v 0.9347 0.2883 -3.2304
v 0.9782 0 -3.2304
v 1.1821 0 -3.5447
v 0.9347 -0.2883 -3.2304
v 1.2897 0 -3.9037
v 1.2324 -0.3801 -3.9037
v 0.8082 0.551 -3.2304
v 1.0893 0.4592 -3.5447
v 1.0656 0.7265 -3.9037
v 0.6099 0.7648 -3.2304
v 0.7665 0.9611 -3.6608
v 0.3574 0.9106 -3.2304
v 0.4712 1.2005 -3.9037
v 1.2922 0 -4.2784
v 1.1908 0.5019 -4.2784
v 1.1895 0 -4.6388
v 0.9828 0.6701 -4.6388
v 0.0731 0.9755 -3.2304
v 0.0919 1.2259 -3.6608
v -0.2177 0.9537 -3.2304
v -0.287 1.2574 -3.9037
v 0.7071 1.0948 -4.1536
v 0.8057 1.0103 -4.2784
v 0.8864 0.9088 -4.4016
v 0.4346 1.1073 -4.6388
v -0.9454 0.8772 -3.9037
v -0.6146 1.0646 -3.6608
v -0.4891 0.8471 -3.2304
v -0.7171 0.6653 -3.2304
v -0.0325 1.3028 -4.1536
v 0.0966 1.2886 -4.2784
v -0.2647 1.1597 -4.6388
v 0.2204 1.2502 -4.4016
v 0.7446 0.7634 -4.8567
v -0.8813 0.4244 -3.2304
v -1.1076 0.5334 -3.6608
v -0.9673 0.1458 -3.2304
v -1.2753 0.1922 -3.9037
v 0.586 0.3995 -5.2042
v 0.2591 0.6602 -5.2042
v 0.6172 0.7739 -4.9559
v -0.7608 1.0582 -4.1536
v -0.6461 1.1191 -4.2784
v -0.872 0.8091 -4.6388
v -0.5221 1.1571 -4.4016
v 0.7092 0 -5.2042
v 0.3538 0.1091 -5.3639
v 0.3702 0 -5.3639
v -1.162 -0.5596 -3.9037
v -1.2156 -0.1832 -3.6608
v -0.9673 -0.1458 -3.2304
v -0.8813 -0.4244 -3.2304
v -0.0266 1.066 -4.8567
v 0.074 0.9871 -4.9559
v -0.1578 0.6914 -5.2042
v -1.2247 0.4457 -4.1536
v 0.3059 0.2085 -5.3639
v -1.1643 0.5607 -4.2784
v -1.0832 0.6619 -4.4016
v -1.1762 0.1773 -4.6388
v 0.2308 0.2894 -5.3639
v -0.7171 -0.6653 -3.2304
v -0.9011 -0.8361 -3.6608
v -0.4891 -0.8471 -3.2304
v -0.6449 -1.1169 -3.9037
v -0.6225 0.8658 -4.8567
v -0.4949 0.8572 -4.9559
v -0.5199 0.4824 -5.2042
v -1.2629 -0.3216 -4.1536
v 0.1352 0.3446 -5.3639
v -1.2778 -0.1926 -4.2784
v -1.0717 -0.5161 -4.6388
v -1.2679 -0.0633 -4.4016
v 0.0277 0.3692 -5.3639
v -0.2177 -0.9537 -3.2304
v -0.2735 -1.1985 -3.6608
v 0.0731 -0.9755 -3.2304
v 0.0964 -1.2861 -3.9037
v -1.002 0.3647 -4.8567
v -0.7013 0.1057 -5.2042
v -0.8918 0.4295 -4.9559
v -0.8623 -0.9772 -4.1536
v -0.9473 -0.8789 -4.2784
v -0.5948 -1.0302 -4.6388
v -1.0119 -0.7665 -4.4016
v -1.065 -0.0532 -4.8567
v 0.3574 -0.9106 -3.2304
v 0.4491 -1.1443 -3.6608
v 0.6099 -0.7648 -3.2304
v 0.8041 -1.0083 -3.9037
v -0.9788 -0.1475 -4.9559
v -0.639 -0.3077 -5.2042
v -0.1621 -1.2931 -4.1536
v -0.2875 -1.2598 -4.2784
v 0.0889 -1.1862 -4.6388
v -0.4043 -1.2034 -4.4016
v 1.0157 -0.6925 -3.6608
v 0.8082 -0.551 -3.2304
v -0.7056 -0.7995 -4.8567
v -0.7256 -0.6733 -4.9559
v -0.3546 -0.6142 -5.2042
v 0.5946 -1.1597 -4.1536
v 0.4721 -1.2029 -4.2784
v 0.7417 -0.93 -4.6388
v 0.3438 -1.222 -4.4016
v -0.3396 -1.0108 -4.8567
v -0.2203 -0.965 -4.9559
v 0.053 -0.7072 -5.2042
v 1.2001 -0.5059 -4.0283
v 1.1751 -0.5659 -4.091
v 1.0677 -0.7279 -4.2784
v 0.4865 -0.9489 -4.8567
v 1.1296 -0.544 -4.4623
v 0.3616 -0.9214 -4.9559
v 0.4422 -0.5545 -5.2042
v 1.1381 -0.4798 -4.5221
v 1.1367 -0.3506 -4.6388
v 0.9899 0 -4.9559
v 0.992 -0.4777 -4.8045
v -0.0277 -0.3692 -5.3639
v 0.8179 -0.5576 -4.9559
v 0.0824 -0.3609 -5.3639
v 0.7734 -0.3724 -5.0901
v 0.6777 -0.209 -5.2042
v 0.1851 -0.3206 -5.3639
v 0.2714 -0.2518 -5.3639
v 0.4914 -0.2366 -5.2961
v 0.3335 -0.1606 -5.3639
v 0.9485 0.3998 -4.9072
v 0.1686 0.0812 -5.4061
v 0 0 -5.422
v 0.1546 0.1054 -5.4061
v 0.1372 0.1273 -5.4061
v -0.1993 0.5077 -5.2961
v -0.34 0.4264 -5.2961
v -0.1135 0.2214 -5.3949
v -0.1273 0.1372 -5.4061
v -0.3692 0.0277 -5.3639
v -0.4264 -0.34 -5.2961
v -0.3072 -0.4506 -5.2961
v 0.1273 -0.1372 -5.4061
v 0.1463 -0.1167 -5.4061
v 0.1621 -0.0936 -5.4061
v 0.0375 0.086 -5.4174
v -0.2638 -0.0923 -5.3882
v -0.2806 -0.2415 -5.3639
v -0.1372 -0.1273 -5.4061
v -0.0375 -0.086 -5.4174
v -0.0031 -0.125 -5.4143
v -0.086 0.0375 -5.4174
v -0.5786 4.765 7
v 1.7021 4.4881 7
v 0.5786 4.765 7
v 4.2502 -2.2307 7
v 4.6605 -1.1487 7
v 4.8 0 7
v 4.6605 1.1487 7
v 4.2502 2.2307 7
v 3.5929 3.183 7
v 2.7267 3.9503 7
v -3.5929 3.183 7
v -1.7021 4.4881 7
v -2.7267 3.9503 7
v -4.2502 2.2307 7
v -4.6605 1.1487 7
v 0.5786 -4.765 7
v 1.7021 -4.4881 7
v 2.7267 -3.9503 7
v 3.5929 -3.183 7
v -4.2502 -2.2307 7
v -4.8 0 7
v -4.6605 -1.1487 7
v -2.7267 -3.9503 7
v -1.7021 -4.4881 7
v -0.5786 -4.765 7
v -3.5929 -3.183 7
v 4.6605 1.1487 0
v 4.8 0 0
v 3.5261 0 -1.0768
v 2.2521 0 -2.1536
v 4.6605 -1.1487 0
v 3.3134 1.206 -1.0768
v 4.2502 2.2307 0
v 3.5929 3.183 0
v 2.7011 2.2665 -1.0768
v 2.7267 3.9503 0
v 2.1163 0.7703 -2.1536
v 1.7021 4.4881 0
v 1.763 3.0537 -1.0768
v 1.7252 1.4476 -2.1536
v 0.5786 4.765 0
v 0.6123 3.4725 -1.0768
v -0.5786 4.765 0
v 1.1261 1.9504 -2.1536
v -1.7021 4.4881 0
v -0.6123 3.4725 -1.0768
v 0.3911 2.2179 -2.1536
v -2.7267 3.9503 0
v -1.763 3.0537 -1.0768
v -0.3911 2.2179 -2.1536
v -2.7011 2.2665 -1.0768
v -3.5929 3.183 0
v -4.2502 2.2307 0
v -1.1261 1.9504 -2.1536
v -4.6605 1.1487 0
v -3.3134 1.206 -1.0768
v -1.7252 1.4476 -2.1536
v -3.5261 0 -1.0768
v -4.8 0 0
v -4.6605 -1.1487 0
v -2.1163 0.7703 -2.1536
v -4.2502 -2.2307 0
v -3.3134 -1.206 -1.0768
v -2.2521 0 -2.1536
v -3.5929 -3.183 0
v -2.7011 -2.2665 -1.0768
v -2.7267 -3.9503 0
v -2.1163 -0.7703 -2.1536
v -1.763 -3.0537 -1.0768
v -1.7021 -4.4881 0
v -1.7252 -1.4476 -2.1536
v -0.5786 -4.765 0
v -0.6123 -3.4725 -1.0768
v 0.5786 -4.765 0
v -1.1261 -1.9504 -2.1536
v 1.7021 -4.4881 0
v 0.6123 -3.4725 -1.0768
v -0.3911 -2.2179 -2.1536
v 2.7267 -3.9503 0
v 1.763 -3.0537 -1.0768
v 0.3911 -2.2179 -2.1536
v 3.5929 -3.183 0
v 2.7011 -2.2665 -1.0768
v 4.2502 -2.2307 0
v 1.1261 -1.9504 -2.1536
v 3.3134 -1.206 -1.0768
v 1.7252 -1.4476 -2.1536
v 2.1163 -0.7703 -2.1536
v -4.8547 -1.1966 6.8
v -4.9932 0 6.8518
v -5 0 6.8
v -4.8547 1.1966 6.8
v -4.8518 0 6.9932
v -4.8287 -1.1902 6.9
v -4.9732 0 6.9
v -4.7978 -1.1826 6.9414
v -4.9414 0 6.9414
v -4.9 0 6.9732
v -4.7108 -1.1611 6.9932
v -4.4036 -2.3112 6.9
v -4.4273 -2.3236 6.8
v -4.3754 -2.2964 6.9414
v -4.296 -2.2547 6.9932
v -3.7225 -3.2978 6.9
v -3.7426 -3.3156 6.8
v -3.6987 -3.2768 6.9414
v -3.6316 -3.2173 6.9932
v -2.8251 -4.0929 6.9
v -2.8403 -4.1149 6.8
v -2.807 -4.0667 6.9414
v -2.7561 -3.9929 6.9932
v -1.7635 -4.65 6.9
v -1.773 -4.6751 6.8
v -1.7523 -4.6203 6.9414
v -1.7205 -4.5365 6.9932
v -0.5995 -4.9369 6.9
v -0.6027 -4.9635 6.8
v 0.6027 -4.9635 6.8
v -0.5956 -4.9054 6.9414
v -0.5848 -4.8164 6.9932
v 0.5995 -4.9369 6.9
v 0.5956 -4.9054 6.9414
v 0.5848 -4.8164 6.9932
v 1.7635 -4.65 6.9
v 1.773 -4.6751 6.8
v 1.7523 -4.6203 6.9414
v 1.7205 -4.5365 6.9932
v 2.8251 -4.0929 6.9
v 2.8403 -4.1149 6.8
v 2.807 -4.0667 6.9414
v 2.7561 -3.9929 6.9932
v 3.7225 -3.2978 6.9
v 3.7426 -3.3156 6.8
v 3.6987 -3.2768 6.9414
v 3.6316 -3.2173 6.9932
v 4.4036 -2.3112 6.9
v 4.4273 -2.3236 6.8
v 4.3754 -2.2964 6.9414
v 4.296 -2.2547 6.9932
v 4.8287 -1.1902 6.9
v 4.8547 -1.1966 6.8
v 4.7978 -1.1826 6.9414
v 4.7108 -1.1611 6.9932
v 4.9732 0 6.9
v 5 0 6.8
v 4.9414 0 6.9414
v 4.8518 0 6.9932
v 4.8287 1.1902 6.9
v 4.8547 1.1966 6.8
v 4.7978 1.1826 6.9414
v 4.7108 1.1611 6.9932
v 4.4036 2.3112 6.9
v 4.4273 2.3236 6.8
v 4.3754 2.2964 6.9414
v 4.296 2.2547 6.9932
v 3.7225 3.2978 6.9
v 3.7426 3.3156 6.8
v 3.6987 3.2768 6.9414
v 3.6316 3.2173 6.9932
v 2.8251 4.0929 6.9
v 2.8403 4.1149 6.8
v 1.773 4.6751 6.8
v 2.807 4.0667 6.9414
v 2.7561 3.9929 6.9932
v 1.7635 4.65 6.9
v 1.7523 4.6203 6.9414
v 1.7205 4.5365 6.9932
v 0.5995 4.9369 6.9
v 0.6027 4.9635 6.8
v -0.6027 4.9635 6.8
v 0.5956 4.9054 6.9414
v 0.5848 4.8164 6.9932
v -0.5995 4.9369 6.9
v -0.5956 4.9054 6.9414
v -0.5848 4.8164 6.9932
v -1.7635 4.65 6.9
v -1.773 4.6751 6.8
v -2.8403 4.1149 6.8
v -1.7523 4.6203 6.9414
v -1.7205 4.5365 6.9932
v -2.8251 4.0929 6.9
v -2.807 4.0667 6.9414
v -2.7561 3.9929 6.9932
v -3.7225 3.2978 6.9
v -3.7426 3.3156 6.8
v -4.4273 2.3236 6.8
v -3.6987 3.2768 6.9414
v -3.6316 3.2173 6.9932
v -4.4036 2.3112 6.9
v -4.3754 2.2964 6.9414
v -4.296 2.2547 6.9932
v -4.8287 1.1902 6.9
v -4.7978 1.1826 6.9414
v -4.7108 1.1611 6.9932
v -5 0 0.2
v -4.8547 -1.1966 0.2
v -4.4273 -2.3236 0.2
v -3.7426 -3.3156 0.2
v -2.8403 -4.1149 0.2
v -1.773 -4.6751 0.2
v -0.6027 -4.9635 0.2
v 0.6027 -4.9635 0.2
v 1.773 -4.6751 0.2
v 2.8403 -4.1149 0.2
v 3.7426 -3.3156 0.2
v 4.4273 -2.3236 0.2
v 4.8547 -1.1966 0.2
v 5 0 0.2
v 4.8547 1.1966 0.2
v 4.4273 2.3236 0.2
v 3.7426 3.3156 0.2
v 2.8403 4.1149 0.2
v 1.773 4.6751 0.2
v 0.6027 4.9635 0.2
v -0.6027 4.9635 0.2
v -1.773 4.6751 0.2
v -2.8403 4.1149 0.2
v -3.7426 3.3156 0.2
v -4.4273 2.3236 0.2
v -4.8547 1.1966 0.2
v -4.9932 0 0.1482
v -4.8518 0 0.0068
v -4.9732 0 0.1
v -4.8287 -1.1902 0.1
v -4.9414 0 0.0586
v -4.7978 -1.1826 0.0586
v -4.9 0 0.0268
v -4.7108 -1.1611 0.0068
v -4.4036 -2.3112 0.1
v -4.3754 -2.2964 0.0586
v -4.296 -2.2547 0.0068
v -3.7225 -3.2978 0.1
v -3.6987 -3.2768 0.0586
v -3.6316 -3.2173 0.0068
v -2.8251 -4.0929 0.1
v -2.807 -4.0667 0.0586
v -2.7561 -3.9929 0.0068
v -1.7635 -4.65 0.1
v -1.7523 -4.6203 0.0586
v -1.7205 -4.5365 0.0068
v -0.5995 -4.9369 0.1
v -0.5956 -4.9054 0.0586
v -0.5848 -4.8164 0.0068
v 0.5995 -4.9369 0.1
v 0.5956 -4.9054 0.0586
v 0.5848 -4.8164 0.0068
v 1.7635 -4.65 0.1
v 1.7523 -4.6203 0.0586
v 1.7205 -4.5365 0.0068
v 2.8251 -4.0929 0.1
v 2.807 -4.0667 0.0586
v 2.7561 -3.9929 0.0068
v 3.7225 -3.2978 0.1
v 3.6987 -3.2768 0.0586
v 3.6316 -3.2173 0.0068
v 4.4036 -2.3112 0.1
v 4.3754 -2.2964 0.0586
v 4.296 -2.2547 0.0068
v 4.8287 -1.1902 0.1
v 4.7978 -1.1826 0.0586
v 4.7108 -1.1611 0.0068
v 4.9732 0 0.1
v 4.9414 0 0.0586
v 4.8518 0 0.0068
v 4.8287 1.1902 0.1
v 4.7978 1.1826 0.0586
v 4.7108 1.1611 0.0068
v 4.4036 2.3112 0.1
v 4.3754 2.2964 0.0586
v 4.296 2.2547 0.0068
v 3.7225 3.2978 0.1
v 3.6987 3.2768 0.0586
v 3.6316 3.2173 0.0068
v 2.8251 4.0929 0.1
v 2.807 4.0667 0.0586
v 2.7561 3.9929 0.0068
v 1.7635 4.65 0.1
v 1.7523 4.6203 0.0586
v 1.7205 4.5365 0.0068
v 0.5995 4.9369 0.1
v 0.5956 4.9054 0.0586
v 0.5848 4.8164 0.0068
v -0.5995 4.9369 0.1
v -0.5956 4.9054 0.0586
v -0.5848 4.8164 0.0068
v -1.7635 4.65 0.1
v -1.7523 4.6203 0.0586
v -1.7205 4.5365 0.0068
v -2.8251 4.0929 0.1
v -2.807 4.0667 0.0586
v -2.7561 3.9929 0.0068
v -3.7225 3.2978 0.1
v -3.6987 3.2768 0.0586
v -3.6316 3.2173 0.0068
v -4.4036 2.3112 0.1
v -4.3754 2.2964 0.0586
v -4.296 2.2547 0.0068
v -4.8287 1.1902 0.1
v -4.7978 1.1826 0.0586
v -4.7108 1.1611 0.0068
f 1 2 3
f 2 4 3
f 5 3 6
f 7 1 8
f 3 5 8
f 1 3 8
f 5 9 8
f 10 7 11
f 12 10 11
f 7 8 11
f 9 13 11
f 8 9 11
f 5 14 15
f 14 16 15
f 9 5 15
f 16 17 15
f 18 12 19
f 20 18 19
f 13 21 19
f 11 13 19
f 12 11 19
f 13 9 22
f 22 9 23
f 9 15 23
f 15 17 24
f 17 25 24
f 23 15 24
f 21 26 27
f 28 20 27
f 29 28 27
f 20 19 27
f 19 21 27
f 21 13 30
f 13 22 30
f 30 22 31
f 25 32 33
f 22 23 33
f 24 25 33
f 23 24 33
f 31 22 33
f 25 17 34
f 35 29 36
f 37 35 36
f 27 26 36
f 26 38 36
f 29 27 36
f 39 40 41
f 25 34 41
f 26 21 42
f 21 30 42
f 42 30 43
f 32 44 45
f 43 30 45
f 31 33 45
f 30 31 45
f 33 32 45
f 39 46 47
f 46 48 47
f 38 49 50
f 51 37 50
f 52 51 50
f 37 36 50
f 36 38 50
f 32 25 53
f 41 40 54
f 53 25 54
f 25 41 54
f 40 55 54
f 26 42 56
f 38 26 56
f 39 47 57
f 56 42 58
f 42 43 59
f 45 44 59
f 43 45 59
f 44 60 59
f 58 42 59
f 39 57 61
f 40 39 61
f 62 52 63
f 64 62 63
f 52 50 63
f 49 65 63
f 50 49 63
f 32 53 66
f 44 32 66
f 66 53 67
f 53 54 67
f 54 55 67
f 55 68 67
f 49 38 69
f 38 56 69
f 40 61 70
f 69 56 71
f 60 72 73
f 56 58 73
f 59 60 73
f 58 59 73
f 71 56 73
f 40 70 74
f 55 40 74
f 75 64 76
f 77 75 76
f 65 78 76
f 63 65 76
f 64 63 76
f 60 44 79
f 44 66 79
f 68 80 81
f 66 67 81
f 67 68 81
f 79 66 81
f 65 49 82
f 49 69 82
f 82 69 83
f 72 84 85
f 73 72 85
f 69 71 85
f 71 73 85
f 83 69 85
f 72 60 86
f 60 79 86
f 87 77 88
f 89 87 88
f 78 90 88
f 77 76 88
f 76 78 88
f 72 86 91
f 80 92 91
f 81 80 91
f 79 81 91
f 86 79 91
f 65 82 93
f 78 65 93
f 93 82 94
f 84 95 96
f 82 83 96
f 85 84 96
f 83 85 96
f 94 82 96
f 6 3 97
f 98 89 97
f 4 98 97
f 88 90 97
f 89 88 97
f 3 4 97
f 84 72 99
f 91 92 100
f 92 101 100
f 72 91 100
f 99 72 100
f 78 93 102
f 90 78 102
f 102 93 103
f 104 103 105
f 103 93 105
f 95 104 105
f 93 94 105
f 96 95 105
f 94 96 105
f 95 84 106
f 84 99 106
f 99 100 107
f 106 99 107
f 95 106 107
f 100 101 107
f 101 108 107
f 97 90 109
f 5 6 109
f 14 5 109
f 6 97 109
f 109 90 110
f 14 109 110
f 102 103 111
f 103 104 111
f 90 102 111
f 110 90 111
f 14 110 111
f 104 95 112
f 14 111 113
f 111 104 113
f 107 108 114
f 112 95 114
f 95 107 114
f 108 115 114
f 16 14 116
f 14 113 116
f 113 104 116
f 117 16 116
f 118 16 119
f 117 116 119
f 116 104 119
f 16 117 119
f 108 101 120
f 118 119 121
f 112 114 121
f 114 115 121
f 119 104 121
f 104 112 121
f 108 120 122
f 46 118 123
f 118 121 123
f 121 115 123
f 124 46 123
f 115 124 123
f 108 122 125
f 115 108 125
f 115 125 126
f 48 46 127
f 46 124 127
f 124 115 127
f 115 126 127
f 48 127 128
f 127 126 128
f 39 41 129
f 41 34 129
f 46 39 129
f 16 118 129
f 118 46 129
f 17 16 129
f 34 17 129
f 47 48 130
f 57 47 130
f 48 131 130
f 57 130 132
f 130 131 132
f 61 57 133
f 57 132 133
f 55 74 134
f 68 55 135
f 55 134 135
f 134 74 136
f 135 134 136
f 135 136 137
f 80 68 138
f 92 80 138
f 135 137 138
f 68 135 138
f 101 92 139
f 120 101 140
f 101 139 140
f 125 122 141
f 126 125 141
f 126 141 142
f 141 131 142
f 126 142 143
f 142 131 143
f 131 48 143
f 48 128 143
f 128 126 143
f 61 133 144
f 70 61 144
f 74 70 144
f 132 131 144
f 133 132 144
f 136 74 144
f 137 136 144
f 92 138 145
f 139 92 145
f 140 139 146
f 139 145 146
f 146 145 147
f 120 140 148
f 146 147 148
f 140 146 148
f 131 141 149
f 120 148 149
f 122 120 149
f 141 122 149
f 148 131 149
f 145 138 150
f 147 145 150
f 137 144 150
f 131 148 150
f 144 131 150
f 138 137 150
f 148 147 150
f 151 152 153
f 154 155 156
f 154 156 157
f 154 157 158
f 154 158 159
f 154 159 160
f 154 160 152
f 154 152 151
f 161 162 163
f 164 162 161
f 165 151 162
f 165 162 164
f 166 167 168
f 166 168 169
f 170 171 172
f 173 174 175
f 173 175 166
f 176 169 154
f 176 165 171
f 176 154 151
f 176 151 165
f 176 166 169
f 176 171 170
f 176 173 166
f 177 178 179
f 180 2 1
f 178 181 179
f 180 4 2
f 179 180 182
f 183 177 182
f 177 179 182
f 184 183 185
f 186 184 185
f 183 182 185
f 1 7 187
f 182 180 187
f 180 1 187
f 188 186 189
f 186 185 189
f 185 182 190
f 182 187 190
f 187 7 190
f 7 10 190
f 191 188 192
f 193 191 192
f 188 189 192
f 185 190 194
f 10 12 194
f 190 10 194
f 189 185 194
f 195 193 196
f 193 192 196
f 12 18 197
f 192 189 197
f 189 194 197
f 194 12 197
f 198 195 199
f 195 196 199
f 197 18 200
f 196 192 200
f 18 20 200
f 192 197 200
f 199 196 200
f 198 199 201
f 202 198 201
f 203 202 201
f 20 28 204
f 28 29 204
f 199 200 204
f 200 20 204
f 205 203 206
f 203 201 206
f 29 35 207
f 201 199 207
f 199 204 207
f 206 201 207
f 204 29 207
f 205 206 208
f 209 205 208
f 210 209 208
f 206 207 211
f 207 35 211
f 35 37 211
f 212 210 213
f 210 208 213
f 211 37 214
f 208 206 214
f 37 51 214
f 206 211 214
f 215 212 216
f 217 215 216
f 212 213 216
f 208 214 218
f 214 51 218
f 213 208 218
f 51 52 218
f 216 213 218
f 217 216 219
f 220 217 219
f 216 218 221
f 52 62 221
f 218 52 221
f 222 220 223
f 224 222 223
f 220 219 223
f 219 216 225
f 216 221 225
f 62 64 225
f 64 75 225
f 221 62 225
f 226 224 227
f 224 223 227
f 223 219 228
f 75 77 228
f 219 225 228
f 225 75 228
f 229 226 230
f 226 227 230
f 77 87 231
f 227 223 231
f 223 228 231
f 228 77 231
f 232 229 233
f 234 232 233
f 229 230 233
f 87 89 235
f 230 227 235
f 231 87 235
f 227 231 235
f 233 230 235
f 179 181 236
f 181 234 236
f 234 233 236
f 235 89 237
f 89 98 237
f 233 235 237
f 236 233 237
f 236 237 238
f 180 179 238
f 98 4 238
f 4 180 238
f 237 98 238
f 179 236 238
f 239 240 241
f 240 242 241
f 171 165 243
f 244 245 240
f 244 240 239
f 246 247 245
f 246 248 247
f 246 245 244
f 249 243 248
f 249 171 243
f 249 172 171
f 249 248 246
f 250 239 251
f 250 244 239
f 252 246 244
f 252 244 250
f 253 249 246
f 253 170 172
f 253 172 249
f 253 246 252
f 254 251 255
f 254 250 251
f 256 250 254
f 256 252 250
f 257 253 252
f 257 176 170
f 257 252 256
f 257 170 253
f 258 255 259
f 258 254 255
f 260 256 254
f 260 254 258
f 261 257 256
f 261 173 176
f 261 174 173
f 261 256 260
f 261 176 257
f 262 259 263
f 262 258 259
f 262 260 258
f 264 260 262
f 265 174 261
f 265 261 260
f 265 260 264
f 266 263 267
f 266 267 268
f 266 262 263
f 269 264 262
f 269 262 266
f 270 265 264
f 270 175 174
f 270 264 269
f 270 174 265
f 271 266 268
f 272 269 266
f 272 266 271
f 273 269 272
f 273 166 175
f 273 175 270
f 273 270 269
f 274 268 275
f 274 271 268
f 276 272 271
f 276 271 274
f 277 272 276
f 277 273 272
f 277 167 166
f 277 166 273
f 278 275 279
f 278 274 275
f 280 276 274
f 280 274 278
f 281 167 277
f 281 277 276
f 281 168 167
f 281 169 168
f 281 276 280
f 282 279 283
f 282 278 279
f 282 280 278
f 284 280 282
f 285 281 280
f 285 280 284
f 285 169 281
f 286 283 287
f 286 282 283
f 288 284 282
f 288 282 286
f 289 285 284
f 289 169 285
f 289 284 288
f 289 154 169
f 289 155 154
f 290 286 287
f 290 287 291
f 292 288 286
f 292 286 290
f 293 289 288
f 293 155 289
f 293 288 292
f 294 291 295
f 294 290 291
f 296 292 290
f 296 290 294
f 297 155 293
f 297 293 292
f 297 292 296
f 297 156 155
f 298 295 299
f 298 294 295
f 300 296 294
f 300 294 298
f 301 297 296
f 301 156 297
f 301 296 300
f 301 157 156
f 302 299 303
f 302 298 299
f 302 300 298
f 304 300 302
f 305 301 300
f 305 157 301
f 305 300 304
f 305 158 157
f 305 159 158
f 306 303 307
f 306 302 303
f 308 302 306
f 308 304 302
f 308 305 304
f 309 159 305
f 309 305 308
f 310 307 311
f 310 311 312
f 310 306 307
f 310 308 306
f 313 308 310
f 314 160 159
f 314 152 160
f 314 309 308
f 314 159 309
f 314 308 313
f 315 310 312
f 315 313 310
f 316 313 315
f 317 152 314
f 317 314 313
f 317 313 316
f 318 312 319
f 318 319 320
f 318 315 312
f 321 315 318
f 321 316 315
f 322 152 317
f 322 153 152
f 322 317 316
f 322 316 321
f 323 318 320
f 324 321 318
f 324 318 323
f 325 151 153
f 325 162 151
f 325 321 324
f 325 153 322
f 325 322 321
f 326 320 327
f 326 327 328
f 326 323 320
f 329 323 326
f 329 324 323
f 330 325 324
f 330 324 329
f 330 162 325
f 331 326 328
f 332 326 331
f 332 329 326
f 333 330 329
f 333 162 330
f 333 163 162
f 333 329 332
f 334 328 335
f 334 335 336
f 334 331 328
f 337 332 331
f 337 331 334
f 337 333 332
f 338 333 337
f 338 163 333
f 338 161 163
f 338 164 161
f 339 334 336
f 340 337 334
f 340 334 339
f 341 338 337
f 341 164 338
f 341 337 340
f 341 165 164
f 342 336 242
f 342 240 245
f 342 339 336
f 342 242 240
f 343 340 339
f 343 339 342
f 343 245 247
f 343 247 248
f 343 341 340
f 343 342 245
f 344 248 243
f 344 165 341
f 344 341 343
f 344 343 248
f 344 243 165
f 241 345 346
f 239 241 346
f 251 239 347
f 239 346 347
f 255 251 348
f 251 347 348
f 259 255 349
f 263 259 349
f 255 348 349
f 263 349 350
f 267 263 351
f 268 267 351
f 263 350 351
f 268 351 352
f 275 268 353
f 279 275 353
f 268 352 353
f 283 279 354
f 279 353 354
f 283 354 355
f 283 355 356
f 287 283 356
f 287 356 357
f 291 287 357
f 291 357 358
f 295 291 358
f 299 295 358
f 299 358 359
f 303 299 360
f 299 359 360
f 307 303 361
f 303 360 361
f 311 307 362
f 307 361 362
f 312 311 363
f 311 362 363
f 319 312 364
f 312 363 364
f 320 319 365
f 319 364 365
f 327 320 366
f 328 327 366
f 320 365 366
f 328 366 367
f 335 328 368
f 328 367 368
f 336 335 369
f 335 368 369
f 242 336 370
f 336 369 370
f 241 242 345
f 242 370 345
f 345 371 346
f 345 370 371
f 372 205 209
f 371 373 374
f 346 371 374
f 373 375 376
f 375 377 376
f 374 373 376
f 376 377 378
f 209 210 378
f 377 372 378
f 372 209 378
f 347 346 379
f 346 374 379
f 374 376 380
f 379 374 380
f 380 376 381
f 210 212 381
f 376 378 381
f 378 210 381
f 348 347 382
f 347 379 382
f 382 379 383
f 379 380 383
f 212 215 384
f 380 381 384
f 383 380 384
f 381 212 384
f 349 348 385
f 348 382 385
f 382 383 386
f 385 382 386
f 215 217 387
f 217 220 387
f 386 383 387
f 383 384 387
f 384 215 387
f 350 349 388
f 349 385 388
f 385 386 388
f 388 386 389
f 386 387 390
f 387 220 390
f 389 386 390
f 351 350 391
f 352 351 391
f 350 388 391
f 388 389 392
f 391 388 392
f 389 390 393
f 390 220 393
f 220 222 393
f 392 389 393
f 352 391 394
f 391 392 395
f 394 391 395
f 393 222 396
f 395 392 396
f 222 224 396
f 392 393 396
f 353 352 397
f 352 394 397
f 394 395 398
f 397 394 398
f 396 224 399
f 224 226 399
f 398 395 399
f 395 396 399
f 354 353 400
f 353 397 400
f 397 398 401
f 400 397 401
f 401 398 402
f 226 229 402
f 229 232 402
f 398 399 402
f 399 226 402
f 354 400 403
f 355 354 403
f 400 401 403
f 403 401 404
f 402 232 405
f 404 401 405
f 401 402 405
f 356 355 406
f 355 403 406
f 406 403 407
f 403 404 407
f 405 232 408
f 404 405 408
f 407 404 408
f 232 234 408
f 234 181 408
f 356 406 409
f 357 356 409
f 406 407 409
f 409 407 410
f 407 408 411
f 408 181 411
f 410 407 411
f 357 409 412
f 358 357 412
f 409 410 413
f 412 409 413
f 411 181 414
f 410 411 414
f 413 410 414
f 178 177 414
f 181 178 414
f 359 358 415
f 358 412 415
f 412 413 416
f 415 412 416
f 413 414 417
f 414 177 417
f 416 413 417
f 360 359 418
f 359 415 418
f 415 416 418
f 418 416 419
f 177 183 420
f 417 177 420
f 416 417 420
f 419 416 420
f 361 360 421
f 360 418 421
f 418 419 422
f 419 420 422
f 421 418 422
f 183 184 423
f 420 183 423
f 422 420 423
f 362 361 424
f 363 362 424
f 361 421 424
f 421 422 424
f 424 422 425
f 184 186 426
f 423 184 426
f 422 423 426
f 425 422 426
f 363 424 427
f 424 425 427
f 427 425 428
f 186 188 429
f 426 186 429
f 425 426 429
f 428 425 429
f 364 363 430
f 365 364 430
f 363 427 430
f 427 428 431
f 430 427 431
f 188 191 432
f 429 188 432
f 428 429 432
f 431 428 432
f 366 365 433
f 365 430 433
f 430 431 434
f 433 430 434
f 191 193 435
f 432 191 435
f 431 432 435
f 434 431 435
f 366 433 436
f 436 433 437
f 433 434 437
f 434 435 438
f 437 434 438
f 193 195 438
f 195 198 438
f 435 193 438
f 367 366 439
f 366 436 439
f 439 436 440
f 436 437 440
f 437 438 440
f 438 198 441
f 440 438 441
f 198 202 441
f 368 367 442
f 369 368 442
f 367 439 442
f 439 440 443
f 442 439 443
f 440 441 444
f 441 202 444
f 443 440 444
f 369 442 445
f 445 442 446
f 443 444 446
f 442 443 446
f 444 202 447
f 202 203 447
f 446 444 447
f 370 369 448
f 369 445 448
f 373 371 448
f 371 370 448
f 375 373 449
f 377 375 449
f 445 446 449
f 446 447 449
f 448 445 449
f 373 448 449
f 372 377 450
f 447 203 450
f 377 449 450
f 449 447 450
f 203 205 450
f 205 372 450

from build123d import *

# Parameters (mm, degrees)
SKETCH1_R           = 5
BOSS_EXTRUDE1_DEPTH = 7
FILLET2_R           = 0.2
FILLET3_R           = 0.2


with BuildPart() as part:
    # Sketch1 → Boss-Extrude1 (new body)
    with BuildSketch(Plane.XY):
        with Locations(Location((0, 0, 0), (0, 0, 180))):
            Circle(SKETCH1_R)
    extrude(amount=BOSS_EXTRUDE1_DEPTH)

    # Fillet2
    fillet2_edges = [part.edges().sort_by_distance(p)[0] for p in [
        (5, 0, 7),
    ]]
    fillet(fillet2_edges, radius=FILLET2_R)

    # Fillet3
    fillet3_edges = [part.edges().sort_by_distance(p)[0] for p in [
        (5, 0, 0),
    ]]
    fillet(fillet3_edges, radius=FILLET3_R)

    # Sketch4 → Revolve1 (revolve)
    with BuildSketch(Plane(origin=(0, 0, 0), x_dir=(1, 0, 0), z_dir=(0, 1, 0))):
        with BuildLine():
            Line((4.8, 0), (0.97819093, 3.230361511))
            ThreePointArc((0.97819093, 3.230361511), (1.18953252, 4.638794693), (0, 5.421968799))
            Line((0, 5.421968799), (0, 0))
            Line((0, 0), (4.8, 0))
        make_face()
    revolve(axis=Axis((0, 0, -5.421968799), (0, 0, 1)))


solid = part.part
